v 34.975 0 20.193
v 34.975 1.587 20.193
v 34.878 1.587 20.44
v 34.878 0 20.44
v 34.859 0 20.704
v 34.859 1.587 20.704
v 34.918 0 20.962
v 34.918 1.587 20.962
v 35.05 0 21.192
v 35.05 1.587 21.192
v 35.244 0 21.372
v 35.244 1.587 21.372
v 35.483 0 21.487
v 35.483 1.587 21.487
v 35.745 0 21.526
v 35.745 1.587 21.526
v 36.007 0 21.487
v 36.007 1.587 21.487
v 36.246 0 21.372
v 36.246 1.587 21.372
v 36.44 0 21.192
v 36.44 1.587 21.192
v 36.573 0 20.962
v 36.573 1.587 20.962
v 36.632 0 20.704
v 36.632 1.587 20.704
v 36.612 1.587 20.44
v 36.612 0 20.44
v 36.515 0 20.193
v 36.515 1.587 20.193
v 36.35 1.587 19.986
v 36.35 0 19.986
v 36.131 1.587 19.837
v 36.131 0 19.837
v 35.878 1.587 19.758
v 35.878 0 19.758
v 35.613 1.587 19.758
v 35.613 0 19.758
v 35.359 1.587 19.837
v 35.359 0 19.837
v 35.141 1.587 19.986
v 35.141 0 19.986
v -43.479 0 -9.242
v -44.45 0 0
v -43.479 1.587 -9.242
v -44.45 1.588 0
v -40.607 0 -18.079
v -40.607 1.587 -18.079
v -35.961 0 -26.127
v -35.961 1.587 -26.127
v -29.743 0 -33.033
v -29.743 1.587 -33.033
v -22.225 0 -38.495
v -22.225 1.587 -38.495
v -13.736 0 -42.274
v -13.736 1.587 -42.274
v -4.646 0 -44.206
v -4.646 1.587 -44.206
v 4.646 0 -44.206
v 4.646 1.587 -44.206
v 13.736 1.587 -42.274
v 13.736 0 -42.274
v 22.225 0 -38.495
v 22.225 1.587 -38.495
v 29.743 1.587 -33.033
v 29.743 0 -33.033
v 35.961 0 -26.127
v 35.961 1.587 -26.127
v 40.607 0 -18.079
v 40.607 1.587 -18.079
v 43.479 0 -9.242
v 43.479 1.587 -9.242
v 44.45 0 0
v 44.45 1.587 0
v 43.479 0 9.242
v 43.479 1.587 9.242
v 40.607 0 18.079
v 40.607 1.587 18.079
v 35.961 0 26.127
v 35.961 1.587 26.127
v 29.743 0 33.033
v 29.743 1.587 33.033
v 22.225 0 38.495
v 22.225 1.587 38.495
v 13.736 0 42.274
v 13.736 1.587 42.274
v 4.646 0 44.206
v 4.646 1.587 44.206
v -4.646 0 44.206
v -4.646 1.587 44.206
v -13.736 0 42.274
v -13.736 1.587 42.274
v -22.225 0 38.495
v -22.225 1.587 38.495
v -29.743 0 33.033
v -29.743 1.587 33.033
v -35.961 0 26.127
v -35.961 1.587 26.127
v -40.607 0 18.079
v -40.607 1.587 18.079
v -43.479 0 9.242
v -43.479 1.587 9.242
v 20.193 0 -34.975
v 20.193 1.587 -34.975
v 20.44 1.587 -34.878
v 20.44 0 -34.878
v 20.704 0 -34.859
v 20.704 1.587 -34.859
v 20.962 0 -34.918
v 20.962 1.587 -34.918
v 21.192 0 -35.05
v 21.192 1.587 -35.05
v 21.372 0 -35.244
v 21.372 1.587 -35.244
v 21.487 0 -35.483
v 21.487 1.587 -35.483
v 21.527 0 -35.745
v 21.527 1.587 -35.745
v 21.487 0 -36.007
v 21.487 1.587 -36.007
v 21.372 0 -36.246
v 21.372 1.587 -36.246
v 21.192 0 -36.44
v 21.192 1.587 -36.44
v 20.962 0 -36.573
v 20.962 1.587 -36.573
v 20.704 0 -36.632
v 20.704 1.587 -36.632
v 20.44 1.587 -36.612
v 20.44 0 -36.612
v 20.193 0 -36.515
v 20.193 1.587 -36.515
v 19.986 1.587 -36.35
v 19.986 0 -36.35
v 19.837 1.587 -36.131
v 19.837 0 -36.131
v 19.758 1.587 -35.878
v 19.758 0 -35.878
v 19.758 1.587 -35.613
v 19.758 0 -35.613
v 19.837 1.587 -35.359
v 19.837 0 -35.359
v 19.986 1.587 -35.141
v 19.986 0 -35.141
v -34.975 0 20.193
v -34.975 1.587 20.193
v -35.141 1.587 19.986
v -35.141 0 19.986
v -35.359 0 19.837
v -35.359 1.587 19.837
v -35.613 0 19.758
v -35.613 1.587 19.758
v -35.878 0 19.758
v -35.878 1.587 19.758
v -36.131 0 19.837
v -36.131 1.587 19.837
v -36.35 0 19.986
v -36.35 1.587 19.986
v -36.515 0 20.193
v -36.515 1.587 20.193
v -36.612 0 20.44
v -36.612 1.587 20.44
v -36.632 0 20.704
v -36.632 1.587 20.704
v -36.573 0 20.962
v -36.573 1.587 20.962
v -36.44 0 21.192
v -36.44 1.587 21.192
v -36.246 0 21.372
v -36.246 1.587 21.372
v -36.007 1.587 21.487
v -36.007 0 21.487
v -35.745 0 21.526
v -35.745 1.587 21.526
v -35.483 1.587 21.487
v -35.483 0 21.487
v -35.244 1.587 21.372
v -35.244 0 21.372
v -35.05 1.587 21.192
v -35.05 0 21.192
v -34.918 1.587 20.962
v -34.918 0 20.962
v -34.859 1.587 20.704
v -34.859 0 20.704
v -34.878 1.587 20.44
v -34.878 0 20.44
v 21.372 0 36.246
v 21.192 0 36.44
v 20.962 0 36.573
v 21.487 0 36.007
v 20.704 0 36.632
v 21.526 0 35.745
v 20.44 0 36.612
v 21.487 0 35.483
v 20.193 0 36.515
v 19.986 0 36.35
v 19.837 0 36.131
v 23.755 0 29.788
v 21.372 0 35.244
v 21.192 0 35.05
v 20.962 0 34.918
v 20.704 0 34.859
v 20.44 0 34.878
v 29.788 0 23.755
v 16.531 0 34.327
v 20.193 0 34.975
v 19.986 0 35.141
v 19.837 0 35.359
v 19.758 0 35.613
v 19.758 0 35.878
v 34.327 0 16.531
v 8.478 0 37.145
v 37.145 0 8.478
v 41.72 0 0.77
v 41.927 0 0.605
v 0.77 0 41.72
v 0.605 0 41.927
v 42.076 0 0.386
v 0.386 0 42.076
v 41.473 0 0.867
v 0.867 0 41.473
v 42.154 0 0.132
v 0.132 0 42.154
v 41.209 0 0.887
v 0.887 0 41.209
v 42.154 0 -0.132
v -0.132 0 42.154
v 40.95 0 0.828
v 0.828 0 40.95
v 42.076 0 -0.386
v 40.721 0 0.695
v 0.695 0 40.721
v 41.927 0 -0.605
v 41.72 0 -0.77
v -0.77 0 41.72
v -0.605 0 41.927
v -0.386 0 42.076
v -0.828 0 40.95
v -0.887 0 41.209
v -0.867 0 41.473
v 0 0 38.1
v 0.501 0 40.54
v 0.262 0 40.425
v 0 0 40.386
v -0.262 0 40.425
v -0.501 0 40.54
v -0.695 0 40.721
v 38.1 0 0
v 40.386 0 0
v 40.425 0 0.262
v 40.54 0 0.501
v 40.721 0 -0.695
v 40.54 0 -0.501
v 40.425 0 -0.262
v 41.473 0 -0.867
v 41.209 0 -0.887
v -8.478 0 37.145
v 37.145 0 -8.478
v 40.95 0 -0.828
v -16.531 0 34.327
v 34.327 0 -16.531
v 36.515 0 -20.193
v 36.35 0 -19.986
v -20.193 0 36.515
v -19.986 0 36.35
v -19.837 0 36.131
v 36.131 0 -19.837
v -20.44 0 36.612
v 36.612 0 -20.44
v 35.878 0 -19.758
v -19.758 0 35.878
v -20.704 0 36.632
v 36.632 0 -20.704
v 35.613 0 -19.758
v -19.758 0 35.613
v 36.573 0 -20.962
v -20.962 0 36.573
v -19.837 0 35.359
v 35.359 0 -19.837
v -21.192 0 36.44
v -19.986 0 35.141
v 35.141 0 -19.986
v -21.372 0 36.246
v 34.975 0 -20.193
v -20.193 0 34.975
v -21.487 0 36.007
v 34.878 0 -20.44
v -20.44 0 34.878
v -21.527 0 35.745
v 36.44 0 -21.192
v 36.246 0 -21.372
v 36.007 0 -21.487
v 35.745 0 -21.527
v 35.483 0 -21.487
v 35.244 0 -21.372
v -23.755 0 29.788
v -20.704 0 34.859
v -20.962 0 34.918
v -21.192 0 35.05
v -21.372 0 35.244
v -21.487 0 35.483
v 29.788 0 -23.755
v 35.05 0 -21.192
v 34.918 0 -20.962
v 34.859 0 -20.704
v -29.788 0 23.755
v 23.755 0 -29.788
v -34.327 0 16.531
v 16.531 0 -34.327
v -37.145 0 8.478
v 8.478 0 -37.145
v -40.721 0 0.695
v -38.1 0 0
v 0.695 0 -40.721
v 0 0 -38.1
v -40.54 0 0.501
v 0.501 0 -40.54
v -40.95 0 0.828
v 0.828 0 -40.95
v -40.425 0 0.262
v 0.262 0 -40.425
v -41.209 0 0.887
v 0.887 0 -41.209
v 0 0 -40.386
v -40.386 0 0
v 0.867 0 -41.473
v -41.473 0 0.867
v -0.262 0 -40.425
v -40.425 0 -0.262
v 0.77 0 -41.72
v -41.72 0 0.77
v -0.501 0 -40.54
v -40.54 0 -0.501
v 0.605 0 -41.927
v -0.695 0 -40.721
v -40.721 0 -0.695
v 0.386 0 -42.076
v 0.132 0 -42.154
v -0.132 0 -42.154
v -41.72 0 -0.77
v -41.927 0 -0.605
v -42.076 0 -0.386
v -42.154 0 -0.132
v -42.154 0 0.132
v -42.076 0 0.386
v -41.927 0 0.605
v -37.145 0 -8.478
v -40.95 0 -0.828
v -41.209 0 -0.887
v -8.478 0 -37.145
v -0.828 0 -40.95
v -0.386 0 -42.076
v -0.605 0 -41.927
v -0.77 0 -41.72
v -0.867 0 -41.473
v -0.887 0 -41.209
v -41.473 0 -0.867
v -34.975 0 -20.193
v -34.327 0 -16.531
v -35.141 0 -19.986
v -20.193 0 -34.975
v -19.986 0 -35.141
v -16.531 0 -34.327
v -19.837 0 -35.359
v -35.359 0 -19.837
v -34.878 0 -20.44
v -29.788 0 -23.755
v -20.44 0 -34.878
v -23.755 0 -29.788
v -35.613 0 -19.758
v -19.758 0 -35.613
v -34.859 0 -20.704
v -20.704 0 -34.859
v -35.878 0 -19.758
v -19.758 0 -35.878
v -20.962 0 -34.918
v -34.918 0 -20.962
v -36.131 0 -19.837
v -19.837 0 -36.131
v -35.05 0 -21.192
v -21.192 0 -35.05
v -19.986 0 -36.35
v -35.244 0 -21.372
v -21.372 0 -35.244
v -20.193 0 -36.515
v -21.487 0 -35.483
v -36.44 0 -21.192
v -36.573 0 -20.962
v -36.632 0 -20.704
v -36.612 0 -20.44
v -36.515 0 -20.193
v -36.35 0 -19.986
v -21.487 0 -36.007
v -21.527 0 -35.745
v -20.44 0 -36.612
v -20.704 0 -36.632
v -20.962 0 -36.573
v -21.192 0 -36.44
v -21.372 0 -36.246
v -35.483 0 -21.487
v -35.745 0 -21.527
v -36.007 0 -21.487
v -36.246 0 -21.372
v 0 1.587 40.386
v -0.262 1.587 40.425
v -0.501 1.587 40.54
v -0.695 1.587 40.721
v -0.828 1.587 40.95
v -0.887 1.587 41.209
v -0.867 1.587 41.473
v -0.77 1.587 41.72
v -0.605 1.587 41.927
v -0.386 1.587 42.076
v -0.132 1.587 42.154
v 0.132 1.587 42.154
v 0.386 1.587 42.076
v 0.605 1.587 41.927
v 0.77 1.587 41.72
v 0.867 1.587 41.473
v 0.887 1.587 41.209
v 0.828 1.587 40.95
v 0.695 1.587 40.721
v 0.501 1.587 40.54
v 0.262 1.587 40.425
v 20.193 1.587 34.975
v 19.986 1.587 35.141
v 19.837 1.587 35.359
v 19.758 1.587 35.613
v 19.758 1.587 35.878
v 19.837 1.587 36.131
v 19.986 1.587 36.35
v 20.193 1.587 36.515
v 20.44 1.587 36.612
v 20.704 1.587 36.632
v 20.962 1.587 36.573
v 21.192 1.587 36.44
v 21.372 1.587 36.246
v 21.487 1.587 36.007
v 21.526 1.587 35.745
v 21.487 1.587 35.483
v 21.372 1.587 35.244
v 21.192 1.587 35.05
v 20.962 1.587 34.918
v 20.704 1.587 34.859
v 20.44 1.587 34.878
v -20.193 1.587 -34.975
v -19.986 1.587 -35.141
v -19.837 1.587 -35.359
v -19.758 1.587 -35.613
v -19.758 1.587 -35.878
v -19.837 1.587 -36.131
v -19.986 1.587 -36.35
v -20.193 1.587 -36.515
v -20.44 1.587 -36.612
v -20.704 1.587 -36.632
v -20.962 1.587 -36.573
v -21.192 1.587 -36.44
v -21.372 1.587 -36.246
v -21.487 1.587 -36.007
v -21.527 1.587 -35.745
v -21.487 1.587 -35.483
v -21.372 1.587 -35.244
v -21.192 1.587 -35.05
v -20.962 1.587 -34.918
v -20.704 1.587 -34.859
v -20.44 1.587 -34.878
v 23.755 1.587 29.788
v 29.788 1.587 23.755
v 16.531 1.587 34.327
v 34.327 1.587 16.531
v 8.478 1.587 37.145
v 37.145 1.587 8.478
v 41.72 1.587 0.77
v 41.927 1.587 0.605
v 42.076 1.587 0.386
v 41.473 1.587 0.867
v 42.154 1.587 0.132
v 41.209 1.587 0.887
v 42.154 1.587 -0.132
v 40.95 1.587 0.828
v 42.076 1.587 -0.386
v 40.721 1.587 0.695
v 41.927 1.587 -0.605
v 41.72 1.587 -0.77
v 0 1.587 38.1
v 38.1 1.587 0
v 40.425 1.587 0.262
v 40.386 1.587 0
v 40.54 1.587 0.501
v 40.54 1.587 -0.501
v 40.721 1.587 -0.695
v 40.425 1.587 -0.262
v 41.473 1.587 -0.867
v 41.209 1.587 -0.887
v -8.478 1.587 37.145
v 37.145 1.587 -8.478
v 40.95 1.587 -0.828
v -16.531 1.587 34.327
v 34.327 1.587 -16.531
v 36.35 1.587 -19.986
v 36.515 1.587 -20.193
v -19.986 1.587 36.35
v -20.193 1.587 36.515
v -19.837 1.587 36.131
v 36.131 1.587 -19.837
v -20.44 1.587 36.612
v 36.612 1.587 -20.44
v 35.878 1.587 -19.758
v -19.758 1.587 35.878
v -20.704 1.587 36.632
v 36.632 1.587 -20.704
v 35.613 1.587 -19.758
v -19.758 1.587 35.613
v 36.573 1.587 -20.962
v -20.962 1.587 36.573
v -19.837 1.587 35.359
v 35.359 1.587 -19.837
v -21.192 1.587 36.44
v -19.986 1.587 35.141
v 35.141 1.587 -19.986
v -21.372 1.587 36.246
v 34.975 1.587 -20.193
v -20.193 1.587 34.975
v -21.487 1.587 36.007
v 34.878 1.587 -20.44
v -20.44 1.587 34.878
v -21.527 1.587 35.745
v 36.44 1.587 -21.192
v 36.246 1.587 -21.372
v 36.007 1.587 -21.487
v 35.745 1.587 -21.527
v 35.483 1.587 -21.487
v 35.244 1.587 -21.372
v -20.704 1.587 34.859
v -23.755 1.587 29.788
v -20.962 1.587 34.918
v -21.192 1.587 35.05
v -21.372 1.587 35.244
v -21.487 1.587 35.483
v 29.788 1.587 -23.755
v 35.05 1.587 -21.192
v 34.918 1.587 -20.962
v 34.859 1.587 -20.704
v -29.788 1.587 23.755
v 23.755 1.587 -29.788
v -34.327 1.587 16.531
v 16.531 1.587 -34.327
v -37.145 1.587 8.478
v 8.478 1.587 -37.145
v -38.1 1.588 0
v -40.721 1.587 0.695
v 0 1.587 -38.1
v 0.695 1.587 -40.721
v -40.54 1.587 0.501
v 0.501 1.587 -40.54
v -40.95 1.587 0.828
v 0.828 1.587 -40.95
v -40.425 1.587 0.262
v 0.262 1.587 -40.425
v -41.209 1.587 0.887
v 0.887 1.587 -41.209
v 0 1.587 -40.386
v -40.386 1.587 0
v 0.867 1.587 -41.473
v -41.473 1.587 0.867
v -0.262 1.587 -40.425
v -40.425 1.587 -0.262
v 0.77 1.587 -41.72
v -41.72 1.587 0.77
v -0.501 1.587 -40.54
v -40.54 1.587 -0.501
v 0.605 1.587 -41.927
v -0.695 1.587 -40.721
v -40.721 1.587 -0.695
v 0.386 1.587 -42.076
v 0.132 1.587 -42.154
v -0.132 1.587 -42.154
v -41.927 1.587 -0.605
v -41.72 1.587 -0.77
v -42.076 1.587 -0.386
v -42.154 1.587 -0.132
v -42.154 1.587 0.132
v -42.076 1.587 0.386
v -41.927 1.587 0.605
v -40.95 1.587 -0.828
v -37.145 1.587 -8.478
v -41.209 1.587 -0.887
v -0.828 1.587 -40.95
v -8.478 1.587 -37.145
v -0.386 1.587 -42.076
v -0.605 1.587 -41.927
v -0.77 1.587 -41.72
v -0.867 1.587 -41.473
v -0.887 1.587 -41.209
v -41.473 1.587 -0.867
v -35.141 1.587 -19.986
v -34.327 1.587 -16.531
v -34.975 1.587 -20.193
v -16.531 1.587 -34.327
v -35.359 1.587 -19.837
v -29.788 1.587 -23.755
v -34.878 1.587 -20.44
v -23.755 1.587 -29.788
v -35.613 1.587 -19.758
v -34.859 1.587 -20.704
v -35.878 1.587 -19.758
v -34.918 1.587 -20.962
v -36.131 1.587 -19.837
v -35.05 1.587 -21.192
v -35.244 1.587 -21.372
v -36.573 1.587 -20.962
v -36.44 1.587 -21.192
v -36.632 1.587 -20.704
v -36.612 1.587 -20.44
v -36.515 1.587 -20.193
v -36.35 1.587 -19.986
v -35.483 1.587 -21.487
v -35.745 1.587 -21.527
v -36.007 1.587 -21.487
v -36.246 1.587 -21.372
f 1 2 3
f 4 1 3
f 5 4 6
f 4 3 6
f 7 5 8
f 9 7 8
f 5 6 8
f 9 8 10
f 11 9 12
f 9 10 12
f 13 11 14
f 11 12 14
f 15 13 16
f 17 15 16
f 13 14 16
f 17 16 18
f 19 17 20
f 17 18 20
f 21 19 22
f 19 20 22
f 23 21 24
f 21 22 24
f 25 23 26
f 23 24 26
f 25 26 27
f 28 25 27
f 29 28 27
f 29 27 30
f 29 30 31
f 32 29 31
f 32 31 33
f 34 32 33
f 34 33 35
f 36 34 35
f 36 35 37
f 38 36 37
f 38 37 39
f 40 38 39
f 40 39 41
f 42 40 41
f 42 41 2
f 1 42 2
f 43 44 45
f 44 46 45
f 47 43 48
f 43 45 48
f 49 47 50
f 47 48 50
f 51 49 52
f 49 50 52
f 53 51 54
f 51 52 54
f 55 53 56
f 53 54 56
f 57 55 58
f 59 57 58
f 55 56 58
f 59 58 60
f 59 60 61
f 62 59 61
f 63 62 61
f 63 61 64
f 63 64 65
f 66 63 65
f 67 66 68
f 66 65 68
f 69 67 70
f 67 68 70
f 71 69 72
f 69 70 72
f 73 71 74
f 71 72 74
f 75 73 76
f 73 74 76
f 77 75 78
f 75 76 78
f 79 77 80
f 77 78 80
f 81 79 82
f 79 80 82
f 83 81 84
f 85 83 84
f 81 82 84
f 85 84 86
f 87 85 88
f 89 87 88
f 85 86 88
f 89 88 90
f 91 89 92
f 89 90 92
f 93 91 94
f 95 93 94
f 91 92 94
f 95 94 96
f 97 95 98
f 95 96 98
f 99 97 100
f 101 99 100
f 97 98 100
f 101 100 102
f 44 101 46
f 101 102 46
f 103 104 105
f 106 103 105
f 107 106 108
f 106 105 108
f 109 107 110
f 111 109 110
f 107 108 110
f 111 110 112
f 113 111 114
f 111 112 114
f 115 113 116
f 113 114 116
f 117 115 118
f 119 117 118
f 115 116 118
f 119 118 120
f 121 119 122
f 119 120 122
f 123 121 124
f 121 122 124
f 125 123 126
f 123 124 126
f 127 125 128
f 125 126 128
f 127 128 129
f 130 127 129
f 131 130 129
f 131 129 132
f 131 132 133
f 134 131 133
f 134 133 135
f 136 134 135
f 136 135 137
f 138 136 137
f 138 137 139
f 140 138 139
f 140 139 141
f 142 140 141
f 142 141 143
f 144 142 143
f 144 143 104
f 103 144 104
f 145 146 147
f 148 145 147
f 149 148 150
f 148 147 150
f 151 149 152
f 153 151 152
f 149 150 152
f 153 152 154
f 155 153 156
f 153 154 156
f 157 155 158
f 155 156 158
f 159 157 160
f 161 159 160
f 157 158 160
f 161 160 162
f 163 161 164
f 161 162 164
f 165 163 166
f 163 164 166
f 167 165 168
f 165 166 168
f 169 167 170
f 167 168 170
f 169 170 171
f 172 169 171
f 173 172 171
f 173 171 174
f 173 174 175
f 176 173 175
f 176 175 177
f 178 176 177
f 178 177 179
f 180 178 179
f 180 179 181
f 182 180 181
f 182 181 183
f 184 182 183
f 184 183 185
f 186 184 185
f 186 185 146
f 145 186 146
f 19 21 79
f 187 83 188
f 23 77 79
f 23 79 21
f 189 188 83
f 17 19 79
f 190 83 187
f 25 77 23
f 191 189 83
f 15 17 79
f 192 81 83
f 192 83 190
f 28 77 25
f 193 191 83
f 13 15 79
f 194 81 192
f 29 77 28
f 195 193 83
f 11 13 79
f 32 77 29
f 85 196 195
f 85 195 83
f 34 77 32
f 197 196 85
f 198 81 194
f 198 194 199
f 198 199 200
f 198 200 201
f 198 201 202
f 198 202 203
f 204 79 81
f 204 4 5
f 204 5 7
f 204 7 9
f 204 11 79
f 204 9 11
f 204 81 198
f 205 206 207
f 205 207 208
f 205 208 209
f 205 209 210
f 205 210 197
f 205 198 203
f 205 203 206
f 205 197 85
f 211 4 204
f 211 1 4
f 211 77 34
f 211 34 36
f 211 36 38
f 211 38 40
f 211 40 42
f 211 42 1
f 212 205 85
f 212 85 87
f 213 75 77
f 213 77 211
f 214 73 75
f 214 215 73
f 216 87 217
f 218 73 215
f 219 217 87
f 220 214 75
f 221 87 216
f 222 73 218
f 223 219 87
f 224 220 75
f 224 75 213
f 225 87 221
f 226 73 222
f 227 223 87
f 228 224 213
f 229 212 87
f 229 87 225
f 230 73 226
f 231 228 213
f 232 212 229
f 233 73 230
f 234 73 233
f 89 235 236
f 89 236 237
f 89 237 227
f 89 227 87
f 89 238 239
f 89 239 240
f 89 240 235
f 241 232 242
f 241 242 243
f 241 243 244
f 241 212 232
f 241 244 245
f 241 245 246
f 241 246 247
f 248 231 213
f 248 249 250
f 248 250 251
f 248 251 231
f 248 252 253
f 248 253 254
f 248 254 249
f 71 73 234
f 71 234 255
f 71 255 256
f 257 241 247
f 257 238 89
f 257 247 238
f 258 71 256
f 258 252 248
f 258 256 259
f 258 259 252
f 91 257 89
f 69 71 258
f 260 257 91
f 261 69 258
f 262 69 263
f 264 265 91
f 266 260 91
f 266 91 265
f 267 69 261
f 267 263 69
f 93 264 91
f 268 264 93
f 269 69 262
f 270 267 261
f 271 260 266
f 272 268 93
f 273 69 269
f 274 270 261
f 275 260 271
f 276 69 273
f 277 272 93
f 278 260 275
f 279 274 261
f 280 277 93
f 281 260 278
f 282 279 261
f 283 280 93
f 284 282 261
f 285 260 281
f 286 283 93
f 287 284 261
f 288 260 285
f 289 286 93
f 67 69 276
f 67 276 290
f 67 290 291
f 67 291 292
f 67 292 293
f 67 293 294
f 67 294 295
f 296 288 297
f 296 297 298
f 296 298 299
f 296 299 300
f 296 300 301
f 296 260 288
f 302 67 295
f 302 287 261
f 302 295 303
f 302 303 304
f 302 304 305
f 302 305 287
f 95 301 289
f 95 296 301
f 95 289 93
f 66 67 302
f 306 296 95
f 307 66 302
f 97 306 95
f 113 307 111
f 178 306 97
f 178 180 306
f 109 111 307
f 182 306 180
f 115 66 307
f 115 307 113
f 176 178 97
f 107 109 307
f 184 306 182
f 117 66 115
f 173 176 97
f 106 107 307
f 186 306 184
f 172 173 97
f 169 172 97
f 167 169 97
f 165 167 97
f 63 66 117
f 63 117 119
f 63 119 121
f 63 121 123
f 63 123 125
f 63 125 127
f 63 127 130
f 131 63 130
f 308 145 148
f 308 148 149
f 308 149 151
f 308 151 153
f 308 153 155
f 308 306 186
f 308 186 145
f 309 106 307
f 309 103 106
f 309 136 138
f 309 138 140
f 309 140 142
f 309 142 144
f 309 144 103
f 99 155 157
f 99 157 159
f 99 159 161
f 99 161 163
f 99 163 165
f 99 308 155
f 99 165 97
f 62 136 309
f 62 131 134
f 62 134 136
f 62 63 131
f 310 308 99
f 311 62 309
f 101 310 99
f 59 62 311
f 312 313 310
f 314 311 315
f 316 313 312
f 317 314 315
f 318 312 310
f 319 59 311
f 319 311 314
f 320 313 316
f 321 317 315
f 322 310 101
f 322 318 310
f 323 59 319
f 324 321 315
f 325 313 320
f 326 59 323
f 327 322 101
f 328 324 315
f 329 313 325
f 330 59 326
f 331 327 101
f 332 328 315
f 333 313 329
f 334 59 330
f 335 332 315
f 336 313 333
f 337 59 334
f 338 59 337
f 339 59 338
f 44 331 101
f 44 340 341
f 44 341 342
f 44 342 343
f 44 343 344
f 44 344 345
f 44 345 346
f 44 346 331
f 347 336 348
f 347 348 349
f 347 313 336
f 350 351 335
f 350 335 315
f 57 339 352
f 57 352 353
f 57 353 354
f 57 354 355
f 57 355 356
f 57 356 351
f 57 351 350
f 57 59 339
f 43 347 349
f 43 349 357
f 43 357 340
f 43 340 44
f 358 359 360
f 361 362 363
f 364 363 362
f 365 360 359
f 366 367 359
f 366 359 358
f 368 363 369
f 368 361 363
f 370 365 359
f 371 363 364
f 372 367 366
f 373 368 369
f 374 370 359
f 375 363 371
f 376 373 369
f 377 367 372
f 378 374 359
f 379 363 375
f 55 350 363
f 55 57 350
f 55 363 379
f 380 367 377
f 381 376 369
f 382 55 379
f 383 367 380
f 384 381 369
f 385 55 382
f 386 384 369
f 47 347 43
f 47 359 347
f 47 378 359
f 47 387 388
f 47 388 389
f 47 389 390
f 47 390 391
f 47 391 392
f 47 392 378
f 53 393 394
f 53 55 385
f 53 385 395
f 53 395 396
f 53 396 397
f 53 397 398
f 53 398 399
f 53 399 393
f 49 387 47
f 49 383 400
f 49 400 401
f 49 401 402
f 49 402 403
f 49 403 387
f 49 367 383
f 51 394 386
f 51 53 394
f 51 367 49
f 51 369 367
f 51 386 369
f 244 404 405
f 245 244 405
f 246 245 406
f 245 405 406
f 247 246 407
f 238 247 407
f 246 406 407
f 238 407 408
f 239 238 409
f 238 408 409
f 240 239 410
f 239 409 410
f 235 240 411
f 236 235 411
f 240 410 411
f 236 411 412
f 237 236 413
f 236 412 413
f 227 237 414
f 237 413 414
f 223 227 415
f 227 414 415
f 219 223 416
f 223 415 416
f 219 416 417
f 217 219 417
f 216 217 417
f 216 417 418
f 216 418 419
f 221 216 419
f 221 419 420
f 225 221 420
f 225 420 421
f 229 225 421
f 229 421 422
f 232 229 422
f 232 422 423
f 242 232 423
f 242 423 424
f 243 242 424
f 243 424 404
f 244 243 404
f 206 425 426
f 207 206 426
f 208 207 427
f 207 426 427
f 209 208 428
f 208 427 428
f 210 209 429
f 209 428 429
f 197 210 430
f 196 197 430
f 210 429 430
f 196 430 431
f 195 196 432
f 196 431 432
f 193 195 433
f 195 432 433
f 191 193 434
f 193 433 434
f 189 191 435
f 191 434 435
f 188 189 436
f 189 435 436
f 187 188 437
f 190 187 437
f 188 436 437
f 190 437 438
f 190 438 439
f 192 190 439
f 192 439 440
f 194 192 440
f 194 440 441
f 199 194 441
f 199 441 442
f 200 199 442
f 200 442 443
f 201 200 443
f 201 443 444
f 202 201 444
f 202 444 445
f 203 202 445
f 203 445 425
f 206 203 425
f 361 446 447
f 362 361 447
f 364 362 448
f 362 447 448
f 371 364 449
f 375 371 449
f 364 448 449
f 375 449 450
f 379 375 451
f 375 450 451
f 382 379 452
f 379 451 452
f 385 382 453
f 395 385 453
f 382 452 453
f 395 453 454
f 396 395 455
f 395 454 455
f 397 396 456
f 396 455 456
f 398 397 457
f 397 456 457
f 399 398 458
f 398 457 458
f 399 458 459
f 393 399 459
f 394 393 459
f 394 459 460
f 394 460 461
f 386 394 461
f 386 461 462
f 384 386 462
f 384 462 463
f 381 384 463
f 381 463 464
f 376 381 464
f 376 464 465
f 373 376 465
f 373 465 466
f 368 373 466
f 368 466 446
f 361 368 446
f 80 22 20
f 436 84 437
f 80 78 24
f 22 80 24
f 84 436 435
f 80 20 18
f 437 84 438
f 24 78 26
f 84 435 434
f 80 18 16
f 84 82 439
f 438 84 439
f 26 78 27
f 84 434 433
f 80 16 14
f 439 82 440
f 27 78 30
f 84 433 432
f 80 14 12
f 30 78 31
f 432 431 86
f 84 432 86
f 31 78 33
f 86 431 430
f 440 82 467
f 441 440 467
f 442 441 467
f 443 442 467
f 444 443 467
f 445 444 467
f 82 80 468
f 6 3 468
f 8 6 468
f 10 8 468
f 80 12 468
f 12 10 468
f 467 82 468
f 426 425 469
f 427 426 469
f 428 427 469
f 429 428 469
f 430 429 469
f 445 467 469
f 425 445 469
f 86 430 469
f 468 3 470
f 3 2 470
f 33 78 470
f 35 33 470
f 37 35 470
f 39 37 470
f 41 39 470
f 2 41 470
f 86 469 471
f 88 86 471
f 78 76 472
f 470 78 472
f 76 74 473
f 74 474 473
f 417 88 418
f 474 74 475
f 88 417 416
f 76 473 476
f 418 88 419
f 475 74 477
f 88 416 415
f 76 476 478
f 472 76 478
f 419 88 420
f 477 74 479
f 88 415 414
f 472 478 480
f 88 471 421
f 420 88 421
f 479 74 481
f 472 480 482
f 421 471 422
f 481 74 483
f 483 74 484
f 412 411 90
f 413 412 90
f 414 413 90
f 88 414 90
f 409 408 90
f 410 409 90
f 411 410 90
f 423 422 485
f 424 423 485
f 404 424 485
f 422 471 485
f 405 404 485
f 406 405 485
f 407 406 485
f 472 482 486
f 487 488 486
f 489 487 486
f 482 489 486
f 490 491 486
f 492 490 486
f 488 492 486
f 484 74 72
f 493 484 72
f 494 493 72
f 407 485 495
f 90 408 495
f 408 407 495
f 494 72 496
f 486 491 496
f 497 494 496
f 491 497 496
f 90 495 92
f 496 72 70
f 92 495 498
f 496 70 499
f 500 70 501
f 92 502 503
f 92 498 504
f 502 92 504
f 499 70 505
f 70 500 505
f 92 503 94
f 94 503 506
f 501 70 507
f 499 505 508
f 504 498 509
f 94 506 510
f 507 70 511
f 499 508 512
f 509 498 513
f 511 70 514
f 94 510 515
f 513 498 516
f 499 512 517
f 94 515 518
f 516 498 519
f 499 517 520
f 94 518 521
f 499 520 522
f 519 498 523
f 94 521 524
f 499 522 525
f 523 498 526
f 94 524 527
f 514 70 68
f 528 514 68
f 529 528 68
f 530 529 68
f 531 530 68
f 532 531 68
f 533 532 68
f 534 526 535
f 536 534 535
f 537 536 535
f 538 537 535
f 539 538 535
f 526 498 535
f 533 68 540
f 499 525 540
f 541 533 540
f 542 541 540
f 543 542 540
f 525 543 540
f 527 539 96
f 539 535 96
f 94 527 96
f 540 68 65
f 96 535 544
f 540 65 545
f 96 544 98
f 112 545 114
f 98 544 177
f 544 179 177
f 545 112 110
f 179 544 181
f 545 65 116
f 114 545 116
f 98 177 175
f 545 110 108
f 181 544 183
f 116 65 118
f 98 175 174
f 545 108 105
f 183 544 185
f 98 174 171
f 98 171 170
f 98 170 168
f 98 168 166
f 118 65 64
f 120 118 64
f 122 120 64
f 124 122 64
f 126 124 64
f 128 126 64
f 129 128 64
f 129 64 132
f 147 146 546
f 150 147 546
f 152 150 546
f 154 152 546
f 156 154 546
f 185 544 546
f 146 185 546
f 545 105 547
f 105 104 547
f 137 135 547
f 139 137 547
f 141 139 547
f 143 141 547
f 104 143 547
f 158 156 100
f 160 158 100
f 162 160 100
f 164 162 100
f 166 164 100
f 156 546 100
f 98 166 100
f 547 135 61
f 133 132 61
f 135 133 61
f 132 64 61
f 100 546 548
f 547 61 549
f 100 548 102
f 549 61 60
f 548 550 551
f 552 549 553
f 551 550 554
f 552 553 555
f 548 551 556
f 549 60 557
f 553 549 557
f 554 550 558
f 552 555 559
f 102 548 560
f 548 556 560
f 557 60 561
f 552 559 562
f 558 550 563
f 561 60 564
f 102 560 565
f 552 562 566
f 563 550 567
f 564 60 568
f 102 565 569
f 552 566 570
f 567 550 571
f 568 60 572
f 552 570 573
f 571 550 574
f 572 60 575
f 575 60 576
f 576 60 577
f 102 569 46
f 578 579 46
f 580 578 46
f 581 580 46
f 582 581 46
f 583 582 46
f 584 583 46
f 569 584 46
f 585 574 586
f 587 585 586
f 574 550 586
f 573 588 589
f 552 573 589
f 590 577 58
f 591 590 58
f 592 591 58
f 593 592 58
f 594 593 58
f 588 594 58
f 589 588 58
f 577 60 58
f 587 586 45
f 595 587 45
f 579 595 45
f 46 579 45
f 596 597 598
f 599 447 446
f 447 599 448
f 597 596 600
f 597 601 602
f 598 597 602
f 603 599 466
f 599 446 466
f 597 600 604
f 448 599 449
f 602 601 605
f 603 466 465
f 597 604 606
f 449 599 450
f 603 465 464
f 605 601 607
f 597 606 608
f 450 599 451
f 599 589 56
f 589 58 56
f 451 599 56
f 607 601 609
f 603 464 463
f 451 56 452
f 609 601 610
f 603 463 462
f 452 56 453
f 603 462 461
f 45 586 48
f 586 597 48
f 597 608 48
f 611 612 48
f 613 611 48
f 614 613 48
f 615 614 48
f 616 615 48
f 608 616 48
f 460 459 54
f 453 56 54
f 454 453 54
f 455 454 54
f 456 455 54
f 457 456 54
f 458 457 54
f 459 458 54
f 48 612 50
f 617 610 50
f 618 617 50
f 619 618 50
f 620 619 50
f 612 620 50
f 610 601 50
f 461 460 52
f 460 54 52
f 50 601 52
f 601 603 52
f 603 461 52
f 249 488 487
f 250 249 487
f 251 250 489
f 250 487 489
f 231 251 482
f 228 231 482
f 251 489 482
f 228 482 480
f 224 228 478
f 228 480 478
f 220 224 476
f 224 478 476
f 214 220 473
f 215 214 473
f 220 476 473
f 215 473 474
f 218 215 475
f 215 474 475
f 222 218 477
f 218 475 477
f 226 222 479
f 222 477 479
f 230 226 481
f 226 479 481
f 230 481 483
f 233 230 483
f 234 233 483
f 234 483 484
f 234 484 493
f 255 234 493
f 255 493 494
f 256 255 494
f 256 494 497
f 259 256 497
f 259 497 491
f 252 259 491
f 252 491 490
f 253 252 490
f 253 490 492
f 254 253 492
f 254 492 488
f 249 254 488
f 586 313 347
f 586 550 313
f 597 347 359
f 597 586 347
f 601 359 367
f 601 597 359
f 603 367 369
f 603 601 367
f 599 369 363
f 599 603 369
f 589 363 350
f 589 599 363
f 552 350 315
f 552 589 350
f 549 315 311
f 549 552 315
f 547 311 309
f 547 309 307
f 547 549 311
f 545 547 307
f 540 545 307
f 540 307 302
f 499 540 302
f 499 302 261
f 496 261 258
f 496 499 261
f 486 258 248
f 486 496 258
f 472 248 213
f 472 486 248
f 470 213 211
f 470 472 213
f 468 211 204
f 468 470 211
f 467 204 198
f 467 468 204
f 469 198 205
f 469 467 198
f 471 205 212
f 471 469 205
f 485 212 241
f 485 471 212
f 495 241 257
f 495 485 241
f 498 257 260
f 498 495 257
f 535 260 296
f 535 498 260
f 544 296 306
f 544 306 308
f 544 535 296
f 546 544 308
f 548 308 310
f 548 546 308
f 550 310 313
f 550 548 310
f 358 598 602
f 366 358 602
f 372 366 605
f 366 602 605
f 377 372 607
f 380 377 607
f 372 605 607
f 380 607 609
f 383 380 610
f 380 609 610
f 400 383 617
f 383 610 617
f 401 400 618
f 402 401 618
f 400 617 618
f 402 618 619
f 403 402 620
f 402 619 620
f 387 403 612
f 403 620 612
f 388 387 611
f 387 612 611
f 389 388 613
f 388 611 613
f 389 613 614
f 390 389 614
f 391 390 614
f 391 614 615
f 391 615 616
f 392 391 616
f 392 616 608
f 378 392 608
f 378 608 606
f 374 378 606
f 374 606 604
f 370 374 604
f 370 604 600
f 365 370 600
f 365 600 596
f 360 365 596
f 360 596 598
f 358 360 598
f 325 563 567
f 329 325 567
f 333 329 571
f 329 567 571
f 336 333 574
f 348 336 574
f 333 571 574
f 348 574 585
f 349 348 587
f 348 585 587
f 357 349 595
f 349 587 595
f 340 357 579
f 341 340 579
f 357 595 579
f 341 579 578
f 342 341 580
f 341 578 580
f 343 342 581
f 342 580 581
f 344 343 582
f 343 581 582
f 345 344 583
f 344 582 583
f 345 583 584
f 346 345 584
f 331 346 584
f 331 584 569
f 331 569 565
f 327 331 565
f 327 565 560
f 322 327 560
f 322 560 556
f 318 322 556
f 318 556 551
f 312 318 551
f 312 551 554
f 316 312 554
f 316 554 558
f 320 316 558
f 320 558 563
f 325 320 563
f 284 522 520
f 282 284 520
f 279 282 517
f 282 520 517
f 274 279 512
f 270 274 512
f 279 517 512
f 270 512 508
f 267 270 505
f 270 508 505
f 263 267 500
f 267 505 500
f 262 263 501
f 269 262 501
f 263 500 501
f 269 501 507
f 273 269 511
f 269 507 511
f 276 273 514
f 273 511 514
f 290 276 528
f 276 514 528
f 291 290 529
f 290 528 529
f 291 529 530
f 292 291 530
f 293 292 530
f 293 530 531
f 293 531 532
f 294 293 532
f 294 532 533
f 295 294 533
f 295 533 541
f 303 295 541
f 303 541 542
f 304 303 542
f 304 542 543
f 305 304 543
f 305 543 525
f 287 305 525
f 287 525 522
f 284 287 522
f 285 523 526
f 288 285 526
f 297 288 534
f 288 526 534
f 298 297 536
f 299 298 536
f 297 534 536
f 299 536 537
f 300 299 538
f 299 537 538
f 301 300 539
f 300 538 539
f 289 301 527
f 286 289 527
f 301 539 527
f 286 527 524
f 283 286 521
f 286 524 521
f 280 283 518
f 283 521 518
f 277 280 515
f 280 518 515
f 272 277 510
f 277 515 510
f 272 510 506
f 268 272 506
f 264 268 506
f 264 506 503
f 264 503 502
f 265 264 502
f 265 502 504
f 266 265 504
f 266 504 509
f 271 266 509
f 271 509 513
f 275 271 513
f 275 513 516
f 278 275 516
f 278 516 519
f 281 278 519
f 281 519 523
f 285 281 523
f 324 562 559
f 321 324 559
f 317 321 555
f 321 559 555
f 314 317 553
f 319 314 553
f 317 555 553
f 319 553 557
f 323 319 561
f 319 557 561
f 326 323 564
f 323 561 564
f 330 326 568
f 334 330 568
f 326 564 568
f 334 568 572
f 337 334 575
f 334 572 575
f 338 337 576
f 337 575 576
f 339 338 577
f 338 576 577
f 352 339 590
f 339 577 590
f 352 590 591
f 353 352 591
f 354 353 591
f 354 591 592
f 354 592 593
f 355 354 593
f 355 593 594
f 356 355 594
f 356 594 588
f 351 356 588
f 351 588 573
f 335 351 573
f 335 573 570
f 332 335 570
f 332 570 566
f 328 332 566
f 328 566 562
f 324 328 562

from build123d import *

# Parameters (mm, degrees)
SKETCH1_W                  = 6.35
SKETCH1_H                  = 1.5875
F_50_0_07_DIAMETER_HOLE1_D = 1.778
SCREW_PASSTHROUGHS_COUNT   = 12


with BuildPart() as part:
    # Sketch1 → Main (revolve)
    with BuildSketch(Plane.XY):
        with Locations((-41.275, 0.79375)):
            Rectangle(SKETCH1_W, SKETCH1_H)
    revolve(axis=Axis((0, 55, 0), (0, -1, 0)))

    # #50 (0.07) Diameter Hole1 (through all)
    with Locations(Plane(origin=(0, 0, 0), x_dir=(-1, 0, 0), z_dir=(0, -1, 0))):
        with Locations((41.275, 0)):
            f_50_0_07_diameter_hole1 = Hole(F_50_0_07_DIAMETER_HOLE1_D / 2)

    # Screw Passthroughs: #50 (0.07) Diameter Hole1 ×12 about axis
    screw_passthroughs_axis = Axis((0, 0, 0), (0, 1, 0))
    for i in range(1, SCREW_PASSTHROUGHS_COUNT):
        add(f_50_0_07_diameter_hole1.rotate(screw_passthroughs_axis, i * 360 / SCREW_PASSTHROUGHS_COUNT), mode=Mode.SUBTRACT)


solid = part.part
